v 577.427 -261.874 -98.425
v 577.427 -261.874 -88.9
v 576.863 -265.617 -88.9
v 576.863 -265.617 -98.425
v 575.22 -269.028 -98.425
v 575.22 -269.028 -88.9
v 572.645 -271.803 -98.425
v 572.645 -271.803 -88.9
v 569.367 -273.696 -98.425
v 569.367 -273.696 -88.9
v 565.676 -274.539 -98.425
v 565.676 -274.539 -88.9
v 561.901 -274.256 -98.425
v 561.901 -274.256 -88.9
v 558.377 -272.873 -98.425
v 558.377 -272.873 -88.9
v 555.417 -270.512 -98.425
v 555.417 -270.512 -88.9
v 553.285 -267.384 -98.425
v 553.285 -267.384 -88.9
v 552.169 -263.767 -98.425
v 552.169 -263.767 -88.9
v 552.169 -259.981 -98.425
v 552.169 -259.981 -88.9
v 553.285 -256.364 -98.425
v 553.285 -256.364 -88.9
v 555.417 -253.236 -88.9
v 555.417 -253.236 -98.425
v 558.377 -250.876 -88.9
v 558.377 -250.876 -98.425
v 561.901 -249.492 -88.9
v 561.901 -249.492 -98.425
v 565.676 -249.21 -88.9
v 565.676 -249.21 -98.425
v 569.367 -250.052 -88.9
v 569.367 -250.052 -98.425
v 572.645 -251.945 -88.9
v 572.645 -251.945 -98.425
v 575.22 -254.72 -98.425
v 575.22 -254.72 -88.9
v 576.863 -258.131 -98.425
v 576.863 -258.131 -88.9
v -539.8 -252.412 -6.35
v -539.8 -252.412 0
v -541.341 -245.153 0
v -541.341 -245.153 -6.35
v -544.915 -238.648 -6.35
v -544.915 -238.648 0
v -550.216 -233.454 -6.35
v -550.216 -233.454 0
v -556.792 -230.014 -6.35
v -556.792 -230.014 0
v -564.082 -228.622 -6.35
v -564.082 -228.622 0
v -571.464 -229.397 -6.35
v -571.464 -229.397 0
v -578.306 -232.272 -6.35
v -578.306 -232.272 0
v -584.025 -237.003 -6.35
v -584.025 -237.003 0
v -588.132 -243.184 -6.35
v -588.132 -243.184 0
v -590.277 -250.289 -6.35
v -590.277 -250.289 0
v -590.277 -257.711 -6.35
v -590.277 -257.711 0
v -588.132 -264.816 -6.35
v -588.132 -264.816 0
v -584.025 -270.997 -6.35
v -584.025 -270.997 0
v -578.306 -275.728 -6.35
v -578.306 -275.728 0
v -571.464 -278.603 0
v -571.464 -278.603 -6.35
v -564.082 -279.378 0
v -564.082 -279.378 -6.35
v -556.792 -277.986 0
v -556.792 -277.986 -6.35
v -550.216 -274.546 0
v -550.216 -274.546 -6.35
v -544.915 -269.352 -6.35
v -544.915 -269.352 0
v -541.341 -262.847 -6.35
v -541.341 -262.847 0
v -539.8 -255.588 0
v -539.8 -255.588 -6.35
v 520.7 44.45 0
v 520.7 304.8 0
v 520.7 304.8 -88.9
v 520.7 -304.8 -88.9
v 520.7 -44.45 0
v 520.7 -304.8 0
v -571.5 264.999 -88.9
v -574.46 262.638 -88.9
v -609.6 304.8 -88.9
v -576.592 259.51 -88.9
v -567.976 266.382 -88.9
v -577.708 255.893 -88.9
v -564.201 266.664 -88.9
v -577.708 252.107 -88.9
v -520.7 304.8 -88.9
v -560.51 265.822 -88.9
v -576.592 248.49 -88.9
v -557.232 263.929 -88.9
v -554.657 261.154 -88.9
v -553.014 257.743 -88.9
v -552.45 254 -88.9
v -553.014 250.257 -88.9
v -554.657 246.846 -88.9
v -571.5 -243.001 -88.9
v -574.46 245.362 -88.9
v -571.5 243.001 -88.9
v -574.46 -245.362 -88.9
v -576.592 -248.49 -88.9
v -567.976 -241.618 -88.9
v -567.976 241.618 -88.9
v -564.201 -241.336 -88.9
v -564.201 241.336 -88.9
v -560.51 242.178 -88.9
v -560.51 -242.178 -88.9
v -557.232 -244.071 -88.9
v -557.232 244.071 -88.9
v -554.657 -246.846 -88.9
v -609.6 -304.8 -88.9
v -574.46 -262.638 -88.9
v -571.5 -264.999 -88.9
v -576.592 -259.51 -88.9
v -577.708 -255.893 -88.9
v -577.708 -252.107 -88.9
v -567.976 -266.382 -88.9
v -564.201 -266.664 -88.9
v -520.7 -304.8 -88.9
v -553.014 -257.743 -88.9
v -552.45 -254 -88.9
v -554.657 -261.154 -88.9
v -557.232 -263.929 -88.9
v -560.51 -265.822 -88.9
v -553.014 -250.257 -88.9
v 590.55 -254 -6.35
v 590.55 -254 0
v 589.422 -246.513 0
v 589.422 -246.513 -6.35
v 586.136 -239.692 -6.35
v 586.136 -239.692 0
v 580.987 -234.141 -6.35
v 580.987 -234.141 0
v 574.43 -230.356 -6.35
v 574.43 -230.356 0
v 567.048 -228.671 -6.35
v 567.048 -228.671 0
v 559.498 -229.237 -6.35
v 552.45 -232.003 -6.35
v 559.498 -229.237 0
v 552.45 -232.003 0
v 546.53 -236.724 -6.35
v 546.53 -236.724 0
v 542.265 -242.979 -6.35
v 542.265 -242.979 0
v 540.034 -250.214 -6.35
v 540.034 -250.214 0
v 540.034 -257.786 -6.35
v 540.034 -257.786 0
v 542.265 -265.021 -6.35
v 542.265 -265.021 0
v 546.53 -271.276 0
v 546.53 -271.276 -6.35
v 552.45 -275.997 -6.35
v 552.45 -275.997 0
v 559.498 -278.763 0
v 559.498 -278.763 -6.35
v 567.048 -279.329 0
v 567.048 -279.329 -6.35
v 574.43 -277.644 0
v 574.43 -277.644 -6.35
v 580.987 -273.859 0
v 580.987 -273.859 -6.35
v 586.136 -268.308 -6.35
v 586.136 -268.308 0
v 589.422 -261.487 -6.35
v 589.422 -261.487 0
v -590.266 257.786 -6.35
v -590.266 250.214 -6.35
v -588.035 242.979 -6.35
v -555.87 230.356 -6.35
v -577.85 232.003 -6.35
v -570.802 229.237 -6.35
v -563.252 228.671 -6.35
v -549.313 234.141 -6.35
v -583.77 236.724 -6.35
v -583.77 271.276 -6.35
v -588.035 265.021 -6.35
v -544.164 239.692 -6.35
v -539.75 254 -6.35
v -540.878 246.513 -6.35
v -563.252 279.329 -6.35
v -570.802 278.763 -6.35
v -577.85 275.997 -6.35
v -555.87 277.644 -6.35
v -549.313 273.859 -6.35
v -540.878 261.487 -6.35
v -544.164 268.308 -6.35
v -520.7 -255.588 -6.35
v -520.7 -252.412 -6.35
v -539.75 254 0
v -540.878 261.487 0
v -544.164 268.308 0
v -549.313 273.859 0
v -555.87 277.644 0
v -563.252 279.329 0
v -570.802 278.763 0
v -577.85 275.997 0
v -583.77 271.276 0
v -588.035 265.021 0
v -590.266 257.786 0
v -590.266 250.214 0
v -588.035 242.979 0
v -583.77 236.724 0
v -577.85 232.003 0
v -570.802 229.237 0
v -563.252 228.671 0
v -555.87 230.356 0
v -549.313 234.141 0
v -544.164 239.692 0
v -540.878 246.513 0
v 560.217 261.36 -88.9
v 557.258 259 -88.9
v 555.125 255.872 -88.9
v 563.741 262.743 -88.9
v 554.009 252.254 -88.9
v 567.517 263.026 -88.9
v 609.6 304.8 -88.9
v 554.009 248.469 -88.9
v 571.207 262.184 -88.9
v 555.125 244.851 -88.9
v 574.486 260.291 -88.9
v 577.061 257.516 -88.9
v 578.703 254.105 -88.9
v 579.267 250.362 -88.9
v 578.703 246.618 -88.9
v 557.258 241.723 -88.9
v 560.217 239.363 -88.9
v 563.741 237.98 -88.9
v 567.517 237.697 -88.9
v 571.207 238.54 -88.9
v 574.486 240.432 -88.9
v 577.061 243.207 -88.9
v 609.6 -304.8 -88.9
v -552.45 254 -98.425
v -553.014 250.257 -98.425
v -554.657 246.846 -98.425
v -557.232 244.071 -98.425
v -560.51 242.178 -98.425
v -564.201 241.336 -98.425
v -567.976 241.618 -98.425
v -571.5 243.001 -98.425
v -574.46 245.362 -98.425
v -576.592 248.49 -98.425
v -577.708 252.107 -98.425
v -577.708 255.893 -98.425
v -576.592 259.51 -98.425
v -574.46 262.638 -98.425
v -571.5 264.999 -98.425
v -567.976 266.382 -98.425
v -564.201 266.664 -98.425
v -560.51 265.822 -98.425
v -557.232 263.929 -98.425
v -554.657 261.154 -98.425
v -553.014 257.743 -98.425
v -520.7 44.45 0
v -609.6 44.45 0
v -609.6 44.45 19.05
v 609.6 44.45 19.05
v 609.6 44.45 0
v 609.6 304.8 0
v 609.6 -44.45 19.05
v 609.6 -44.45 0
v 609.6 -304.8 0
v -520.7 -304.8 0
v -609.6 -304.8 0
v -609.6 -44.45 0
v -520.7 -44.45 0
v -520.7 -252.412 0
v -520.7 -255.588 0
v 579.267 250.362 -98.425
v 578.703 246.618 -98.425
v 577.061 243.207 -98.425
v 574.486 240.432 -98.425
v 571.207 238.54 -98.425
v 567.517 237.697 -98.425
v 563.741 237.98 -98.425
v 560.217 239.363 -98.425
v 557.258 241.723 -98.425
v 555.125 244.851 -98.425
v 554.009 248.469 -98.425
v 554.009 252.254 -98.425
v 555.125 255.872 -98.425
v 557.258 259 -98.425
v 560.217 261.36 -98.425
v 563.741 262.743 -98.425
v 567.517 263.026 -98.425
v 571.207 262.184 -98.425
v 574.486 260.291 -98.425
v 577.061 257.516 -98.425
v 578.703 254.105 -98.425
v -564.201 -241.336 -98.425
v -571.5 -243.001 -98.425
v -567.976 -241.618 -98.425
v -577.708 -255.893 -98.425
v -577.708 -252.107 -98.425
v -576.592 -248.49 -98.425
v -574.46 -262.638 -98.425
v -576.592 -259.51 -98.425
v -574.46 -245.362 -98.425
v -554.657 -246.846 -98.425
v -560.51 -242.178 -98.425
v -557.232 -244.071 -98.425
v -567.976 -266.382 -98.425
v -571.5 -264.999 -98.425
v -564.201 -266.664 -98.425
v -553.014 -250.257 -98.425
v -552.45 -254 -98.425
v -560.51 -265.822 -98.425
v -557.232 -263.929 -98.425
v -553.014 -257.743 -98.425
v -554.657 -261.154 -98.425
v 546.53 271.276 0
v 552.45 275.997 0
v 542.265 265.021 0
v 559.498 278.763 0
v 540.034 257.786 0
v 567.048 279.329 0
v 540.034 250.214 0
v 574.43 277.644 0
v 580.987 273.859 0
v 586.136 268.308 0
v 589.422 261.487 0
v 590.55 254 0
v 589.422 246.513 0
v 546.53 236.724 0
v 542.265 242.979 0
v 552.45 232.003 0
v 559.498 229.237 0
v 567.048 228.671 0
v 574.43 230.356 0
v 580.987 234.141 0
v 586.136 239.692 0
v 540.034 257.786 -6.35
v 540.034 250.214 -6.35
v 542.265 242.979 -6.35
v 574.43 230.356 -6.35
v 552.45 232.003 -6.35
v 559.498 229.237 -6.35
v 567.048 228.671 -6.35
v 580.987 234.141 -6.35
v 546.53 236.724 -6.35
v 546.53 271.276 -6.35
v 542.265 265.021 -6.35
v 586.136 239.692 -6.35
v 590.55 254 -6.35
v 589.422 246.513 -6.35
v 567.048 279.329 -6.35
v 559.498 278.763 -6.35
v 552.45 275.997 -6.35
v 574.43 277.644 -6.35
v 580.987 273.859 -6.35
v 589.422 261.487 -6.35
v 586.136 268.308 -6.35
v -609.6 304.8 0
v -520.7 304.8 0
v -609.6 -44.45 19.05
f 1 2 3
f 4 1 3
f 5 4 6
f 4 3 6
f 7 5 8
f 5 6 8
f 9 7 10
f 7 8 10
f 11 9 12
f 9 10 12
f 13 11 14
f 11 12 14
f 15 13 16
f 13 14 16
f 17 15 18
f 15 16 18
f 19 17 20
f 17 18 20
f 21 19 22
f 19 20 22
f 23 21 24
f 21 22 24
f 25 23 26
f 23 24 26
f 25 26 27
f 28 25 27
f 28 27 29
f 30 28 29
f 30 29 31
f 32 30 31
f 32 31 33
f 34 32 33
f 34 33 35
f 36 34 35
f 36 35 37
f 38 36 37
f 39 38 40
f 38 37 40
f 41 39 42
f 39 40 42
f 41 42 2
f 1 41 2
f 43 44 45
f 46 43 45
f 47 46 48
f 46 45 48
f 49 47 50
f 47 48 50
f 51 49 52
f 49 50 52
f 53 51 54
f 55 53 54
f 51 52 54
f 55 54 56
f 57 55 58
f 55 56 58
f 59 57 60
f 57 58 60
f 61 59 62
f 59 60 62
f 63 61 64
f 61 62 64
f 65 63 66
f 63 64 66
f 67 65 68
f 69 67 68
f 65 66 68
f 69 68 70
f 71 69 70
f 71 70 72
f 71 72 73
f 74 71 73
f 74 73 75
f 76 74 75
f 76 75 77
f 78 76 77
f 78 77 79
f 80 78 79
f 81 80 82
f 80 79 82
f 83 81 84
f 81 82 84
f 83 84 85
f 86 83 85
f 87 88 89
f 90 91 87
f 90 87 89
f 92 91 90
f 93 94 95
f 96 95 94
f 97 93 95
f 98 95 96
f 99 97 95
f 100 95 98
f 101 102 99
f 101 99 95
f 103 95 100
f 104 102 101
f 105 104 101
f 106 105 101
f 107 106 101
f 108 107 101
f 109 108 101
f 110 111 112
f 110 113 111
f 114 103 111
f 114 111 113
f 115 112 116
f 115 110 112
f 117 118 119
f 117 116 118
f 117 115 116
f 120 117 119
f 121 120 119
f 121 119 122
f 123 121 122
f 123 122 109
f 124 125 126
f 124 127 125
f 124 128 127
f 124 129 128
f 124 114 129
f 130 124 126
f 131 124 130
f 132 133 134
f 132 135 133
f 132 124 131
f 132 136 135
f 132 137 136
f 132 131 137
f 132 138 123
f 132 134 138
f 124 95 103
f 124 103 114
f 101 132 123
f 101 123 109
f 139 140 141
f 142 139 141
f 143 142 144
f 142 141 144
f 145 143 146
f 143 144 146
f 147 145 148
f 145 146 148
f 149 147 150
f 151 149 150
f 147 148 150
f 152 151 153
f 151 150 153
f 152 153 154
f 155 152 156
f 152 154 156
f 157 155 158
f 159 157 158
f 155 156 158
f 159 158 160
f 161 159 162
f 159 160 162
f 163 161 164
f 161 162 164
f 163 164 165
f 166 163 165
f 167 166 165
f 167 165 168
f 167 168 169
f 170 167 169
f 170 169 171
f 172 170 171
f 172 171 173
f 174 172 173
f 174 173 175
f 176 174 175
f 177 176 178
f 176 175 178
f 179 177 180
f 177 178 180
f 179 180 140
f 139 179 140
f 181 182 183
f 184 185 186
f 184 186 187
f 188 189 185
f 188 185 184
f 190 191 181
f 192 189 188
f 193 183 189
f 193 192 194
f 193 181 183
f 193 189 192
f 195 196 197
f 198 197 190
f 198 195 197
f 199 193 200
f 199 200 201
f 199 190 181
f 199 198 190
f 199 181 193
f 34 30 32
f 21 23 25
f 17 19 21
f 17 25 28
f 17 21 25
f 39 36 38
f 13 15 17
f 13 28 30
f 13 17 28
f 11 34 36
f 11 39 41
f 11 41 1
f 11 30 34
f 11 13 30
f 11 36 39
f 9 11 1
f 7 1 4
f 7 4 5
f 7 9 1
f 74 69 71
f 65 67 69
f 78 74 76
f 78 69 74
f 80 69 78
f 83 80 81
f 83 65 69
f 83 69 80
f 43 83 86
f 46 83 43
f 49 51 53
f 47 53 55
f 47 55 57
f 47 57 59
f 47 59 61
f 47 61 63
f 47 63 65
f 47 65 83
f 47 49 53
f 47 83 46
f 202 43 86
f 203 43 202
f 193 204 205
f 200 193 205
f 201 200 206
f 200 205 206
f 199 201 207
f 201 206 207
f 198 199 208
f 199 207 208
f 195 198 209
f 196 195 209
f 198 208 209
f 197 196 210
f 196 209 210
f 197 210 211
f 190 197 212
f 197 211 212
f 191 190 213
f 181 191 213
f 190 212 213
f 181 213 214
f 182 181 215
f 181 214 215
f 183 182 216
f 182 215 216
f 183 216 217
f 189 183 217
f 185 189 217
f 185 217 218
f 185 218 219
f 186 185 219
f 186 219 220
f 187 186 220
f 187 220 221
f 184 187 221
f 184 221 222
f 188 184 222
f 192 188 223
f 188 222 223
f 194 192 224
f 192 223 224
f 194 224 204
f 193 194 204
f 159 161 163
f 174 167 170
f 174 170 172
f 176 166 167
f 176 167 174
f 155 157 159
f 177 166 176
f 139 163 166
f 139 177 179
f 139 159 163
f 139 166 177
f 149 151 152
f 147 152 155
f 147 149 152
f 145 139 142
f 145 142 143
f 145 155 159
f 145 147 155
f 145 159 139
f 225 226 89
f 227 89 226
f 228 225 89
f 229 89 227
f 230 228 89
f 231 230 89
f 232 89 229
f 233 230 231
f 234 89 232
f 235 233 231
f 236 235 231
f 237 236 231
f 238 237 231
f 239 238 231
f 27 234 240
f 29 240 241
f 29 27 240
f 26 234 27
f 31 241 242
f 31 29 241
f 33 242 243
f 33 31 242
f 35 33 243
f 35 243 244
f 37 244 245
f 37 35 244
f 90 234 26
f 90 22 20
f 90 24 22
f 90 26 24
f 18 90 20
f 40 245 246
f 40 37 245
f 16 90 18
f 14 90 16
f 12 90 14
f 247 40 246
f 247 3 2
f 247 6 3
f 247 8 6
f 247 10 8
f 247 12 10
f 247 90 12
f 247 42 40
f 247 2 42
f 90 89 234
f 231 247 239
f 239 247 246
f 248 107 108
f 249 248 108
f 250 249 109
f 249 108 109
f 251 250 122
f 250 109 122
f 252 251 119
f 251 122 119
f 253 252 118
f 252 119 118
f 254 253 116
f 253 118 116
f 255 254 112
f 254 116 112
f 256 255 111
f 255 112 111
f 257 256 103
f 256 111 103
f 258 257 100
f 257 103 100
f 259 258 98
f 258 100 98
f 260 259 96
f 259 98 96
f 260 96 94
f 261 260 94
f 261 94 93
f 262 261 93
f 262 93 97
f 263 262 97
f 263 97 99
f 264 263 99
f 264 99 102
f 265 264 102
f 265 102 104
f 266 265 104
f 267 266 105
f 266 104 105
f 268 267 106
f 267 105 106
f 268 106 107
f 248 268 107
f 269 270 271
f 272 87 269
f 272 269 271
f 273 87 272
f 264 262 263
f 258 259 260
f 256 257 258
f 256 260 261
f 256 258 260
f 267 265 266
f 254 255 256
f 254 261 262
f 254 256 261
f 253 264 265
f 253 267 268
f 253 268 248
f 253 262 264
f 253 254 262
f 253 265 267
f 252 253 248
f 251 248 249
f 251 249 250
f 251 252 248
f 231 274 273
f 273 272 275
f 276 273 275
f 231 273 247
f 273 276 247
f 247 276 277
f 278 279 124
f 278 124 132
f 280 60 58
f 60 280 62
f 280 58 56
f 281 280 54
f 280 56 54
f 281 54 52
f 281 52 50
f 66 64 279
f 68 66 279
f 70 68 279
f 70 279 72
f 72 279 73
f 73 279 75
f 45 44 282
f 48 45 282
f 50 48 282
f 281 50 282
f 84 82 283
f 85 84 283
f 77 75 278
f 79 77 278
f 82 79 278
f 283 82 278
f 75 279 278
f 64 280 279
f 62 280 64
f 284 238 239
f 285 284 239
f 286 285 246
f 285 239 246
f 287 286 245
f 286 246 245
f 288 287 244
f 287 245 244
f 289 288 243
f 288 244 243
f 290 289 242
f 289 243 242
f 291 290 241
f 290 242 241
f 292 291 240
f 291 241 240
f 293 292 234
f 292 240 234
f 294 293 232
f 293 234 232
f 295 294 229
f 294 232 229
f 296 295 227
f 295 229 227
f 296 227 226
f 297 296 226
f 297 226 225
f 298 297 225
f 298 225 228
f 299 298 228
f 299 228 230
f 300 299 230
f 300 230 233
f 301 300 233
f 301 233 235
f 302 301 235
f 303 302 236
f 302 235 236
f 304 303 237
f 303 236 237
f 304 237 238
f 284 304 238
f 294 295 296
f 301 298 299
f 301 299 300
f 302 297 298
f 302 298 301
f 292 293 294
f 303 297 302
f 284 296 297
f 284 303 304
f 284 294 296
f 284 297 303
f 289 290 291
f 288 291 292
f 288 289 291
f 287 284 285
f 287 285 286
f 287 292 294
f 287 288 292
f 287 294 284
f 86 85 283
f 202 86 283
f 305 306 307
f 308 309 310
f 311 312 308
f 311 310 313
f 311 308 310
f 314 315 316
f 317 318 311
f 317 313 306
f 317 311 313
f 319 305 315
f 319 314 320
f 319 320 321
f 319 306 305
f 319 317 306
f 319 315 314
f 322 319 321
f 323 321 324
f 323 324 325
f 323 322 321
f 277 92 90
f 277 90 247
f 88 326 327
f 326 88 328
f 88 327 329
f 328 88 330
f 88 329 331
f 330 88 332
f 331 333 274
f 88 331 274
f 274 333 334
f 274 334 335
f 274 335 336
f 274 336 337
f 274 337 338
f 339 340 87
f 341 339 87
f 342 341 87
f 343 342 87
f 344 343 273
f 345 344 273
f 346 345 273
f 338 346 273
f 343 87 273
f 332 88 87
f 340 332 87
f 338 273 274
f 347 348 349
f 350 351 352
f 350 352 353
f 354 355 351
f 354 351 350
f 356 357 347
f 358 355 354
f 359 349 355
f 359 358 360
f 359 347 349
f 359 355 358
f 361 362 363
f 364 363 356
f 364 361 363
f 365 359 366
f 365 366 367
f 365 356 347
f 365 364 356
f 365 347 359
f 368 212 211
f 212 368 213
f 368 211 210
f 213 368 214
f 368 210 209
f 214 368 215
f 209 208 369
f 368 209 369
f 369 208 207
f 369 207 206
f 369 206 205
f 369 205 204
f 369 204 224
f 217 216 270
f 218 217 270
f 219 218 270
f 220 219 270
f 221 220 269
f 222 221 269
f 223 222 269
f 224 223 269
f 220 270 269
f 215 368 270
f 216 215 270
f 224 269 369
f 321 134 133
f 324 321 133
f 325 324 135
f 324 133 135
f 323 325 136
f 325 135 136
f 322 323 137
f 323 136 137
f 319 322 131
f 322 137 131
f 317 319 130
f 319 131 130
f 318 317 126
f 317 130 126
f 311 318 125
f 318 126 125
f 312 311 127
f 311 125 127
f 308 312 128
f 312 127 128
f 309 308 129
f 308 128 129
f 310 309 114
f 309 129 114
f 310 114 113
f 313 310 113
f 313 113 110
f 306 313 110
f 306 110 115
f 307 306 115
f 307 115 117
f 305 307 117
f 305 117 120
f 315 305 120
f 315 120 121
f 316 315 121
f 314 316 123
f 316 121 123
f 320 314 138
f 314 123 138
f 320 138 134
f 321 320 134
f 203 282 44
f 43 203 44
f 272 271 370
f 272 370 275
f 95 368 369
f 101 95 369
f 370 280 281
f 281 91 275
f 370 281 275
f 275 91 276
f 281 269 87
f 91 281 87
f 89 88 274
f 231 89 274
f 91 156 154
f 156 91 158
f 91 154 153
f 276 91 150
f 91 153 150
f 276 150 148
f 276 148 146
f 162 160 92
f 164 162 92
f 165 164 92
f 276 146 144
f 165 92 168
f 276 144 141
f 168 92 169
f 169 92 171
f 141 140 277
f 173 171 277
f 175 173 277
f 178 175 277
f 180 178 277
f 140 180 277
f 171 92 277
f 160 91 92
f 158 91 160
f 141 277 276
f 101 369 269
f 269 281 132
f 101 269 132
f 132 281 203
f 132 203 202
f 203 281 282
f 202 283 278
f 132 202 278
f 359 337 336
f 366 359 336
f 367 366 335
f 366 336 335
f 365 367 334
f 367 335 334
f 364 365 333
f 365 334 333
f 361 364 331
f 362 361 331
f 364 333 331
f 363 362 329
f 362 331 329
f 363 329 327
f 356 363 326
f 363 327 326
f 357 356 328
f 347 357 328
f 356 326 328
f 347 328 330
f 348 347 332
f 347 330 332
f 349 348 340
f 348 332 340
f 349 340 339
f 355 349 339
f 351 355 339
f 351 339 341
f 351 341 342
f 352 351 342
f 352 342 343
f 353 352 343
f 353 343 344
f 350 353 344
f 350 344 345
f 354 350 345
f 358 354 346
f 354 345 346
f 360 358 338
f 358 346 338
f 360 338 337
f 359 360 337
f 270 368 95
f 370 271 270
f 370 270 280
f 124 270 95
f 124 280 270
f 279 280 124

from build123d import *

# Parameters (mm, degrees)
F0_W     = 1219.2
F0_H     = 88.9
F1_DEPTH = 19.05
F2_W     = 88.9
F2_H     = 609.6
F3_DEPTH = 88.9
F4_W     = 88.9
F4_H     = 609.6
F5_DEPTH = 88.9
F6_R     = 12.7
F7_DEPTH = 9.525
F8_R     = 25.4
F9_DEPTH = 6.35


with BuildPart() as f1:
    # F0 (on Top) → F1 (new body)
    with BuildSketch(Plane.XY):
        Rectangle(F0_W, F0_H)
    extrude(amount=F1_DEPTH)

    # F2 (on face) → F3 (join)
    with BuildSketch(Plane(origin=(0, 0, 0), x_dir=(1, 0, 0), z_dir=(0, 0, -1))):
        with Locations((-565.15, 0)):
            Rectangle(F2_W, F2_H)
    extrude(amount=F3_DEPTH)

    # F4 (on face) → F5 (join)
    with BuildSketch(Plane(origin=(0, 0, 0), x_dir=(1, 0, 0), z_dir=(0, 0, -1))):
        with Locations((565.15, 0)):
            Rectangle(F4_W, F4_H)
    extrude(amount=F5_DEPTH)

    # F6 (on face) → F7 (join)
    with BuildSketch(Plane(origin=(0, 0, -88.9), x_dir=(1, 0, 0), z_dir=(0, 0, -1))):
        with Locations((-565.15, 254)):
            Circle(F6_R)
        with Locations((-565.15, -254)):
            Circle(F6_R)
        with Locations((564.726949, 261.87405)):
            Circle(F6_R)
        with Locations((566.567481, -250.361617)):
            Circle(F6_R)
    extrude(amount=F7_DEPTH)

    # F8 (on face) → F9 (cut)
    with BuildSketch(Plane.XY):
        with BuildLine():
            ThreePointArc((-539.799658, -255.5875), (-539.762418, -254.794138), (-539.75, -254))
            ThreePointArc((-539.75, -254), (-539.762418, -253.205862), (-539.799658, -252.4125))
            ThreePointArc((-539.799658, -252.4125), (-590.55, -254), (-539.799658, -255.5875))
        make_face()
        with Locations((-565.15, 254)):
            Circle(F8_R)
        with Locations((565.15, 254)):
            Circle(F8_R)
        with Locations((565.15, -254)):
            Circle(F8_R)
        with BuildLine():
            ThreePointArc((-539.799658, -252.4125), (-539.762418, -253.205862), (-539.75, -254))
            ThreePointArc((-539.75, -254), (-539.762418, -254.794138), (-539.799658, -255.5875))
            Line((-539.799658, -255.5875), (-520.7, -255.5875))
            Line((-520.7, -255.5875), (-520.7, -254))
            Line((-520.7, -254), (-520.7, -252.4125))
            Line((-520.7, -252.4125), (-539.799658, -252.4125))
        make_face()
    extrude(amount=-F9_DEPTH, mode=Mode.SUBTRACT)


solid = f1.part
